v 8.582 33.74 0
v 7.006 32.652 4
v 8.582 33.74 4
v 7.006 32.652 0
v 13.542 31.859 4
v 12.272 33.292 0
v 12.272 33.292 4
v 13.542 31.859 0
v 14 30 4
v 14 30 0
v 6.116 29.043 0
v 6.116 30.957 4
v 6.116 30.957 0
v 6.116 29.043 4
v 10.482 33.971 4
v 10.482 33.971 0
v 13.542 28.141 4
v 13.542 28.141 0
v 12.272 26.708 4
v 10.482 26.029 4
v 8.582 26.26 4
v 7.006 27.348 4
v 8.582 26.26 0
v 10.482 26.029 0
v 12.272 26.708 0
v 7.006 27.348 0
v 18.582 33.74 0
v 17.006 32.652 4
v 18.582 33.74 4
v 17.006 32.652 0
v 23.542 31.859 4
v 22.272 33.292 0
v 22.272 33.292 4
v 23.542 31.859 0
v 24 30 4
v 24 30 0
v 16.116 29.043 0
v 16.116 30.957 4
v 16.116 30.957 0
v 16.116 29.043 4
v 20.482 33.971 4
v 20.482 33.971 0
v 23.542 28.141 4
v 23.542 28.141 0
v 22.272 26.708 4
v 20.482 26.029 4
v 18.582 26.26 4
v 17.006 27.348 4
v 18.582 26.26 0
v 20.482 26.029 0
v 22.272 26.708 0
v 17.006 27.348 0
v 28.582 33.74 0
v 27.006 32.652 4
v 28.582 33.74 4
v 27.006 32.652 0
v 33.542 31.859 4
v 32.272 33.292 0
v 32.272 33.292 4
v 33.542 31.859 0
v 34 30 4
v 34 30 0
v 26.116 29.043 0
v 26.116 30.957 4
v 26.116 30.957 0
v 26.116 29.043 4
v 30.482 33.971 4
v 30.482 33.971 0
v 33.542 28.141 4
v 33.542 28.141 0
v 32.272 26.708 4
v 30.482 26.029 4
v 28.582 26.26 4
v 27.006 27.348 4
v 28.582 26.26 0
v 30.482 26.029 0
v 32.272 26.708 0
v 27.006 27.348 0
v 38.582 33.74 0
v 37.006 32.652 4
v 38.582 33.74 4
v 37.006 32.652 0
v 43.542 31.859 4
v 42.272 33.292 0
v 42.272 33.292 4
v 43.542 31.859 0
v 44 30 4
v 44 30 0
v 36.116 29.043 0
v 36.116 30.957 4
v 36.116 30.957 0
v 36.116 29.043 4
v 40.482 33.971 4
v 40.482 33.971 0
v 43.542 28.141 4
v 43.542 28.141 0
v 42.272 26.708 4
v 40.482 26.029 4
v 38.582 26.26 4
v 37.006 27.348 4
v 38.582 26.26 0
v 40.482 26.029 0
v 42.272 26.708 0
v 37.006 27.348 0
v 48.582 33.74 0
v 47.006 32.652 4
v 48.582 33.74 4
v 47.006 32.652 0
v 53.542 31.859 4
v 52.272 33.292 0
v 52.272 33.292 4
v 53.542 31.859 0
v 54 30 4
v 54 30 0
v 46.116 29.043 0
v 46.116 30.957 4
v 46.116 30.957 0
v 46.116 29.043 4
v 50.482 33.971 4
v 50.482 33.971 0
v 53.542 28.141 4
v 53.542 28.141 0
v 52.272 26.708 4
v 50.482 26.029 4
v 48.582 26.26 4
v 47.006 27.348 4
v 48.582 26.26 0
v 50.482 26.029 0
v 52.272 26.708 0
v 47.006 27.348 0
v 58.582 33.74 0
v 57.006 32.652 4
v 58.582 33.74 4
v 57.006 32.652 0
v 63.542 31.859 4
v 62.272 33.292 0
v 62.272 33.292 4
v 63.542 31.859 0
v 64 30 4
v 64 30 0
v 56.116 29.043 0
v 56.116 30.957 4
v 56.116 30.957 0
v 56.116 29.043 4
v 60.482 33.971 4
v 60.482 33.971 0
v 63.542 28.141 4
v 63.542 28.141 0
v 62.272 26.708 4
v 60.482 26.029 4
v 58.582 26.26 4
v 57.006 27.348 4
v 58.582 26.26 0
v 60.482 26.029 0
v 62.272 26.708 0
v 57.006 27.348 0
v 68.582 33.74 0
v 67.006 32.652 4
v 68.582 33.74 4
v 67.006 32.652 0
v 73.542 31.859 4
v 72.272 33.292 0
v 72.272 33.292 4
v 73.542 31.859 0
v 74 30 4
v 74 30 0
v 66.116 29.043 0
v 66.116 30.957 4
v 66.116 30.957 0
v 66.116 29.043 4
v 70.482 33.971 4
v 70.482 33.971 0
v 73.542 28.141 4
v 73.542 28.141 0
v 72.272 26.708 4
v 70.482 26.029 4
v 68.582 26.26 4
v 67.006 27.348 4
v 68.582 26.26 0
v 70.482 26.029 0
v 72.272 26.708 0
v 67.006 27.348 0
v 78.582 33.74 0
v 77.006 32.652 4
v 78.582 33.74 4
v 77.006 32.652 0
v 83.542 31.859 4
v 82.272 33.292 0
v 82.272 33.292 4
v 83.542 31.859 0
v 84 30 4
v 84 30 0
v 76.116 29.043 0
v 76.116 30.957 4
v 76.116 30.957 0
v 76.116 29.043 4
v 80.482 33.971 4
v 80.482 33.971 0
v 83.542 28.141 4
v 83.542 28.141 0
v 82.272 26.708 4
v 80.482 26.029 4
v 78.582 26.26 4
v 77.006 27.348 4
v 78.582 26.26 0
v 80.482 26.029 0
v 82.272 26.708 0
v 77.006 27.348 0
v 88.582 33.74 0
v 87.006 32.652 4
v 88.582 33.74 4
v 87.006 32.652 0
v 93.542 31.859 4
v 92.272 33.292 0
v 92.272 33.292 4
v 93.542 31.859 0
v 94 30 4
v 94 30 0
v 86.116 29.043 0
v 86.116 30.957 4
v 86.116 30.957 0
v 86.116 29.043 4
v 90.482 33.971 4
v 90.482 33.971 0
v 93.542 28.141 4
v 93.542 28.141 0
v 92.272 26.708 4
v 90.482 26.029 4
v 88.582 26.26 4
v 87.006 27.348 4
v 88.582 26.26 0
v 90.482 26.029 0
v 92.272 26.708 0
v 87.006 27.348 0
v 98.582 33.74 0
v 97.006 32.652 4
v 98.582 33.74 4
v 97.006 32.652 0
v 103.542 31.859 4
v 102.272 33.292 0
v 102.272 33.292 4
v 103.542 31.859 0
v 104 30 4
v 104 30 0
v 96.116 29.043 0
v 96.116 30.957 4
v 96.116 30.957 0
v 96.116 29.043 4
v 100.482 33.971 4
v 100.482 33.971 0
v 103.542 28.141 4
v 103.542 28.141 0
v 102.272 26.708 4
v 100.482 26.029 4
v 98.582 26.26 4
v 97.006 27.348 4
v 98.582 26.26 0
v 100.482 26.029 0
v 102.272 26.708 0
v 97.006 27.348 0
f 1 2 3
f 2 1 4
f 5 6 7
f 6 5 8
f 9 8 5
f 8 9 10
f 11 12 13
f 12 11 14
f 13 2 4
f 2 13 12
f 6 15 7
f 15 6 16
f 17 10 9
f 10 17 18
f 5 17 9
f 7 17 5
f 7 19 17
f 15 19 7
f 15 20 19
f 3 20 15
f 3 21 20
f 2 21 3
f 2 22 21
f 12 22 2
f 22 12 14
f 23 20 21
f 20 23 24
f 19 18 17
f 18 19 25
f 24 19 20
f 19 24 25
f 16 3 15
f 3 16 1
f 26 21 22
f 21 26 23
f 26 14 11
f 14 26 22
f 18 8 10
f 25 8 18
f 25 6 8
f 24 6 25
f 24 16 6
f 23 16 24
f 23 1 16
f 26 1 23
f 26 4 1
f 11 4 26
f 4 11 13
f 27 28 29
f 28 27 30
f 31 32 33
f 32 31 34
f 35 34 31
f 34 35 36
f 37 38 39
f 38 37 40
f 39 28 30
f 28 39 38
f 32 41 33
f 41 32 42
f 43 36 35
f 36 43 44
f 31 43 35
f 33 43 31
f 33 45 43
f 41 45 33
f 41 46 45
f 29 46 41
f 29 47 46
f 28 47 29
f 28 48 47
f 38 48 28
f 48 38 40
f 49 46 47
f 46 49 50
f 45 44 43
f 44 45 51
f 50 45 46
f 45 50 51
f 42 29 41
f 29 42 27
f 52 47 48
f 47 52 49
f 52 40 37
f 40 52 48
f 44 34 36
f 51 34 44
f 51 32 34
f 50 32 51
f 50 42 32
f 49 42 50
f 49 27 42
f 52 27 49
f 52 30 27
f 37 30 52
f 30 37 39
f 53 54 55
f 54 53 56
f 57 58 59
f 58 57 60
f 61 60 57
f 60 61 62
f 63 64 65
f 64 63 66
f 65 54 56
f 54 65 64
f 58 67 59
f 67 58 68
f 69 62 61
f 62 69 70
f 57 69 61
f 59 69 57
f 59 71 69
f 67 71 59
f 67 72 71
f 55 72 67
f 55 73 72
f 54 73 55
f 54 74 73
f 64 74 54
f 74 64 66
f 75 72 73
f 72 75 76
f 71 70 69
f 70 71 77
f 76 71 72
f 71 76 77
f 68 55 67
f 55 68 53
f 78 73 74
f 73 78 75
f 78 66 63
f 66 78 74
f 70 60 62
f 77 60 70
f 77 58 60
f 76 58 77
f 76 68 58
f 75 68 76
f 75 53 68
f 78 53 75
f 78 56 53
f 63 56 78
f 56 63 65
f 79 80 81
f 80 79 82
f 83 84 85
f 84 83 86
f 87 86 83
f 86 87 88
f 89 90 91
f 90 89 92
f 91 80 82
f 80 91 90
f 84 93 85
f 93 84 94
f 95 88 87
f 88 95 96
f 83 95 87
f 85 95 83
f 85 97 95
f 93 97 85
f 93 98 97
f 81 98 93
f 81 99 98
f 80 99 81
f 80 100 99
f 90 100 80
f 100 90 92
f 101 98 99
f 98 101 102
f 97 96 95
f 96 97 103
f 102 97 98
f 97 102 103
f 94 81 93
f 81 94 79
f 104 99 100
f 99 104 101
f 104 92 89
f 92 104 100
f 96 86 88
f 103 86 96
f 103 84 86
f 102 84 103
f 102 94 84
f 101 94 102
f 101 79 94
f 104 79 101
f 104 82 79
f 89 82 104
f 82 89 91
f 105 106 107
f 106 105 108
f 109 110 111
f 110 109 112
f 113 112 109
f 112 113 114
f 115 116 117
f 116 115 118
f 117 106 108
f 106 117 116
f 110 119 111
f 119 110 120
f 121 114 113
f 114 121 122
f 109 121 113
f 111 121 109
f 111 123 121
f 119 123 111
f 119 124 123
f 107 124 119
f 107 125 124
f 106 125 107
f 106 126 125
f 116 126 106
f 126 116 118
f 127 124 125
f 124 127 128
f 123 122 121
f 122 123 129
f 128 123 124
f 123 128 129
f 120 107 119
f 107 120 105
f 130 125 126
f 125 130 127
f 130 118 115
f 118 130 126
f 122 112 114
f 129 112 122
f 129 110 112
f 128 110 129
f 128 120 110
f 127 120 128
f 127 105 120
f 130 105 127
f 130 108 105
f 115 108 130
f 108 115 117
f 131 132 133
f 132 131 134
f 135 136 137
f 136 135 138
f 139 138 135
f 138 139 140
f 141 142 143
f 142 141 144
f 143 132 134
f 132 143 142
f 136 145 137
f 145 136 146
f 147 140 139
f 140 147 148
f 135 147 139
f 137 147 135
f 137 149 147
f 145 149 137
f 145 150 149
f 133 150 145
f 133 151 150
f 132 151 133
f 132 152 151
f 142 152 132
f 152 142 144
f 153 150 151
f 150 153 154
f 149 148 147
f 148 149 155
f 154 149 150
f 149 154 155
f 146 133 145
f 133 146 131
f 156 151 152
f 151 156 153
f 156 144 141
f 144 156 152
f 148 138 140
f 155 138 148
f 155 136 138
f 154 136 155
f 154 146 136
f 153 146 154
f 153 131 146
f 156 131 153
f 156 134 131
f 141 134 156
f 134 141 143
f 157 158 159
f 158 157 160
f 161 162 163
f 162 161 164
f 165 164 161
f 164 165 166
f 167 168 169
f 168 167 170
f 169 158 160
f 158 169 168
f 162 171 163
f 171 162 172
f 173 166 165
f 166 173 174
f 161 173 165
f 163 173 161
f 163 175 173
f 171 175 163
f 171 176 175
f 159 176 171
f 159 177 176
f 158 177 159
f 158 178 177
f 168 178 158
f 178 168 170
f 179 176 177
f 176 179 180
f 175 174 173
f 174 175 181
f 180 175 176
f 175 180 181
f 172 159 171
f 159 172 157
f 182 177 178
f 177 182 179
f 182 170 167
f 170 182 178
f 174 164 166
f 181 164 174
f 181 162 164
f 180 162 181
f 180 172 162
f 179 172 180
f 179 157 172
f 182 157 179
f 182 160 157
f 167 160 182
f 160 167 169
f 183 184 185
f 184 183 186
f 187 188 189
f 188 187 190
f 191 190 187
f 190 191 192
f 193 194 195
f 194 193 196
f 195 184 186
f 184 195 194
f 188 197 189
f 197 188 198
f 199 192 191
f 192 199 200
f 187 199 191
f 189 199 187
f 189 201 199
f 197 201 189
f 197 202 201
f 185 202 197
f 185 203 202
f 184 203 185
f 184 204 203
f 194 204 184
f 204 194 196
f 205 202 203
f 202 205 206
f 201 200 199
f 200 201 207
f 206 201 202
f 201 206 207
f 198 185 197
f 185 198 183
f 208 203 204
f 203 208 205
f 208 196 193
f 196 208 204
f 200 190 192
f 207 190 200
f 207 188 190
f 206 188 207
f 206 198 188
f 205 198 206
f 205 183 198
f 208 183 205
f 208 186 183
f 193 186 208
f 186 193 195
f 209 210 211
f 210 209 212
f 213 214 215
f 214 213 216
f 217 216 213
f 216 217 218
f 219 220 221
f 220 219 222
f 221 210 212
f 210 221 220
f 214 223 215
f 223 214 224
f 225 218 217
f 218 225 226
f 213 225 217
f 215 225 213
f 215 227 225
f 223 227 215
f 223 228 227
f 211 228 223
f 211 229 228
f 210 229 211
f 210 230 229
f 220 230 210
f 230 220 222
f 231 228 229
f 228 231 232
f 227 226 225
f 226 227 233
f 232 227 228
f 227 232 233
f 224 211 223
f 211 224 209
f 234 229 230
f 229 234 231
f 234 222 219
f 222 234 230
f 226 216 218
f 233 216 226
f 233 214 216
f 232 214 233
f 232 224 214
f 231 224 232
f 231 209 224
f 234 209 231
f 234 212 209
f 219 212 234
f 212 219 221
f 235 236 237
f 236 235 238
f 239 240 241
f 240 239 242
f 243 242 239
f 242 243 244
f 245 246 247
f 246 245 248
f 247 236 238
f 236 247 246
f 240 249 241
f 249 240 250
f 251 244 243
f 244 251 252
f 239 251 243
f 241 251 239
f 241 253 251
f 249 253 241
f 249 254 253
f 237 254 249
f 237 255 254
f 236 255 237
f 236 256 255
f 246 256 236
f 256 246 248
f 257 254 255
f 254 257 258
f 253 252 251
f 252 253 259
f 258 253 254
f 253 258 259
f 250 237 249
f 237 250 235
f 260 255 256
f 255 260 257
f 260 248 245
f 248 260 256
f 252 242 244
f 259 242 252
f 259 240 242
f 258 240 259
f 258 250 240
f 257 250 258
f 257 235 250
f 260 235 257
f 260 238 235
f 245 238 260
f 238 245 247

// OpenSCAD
for(x=[10:10:100]) {
	translate([x, 30, 0]) cylinder(h=4, r=4);
	echo("x:", x);
}
